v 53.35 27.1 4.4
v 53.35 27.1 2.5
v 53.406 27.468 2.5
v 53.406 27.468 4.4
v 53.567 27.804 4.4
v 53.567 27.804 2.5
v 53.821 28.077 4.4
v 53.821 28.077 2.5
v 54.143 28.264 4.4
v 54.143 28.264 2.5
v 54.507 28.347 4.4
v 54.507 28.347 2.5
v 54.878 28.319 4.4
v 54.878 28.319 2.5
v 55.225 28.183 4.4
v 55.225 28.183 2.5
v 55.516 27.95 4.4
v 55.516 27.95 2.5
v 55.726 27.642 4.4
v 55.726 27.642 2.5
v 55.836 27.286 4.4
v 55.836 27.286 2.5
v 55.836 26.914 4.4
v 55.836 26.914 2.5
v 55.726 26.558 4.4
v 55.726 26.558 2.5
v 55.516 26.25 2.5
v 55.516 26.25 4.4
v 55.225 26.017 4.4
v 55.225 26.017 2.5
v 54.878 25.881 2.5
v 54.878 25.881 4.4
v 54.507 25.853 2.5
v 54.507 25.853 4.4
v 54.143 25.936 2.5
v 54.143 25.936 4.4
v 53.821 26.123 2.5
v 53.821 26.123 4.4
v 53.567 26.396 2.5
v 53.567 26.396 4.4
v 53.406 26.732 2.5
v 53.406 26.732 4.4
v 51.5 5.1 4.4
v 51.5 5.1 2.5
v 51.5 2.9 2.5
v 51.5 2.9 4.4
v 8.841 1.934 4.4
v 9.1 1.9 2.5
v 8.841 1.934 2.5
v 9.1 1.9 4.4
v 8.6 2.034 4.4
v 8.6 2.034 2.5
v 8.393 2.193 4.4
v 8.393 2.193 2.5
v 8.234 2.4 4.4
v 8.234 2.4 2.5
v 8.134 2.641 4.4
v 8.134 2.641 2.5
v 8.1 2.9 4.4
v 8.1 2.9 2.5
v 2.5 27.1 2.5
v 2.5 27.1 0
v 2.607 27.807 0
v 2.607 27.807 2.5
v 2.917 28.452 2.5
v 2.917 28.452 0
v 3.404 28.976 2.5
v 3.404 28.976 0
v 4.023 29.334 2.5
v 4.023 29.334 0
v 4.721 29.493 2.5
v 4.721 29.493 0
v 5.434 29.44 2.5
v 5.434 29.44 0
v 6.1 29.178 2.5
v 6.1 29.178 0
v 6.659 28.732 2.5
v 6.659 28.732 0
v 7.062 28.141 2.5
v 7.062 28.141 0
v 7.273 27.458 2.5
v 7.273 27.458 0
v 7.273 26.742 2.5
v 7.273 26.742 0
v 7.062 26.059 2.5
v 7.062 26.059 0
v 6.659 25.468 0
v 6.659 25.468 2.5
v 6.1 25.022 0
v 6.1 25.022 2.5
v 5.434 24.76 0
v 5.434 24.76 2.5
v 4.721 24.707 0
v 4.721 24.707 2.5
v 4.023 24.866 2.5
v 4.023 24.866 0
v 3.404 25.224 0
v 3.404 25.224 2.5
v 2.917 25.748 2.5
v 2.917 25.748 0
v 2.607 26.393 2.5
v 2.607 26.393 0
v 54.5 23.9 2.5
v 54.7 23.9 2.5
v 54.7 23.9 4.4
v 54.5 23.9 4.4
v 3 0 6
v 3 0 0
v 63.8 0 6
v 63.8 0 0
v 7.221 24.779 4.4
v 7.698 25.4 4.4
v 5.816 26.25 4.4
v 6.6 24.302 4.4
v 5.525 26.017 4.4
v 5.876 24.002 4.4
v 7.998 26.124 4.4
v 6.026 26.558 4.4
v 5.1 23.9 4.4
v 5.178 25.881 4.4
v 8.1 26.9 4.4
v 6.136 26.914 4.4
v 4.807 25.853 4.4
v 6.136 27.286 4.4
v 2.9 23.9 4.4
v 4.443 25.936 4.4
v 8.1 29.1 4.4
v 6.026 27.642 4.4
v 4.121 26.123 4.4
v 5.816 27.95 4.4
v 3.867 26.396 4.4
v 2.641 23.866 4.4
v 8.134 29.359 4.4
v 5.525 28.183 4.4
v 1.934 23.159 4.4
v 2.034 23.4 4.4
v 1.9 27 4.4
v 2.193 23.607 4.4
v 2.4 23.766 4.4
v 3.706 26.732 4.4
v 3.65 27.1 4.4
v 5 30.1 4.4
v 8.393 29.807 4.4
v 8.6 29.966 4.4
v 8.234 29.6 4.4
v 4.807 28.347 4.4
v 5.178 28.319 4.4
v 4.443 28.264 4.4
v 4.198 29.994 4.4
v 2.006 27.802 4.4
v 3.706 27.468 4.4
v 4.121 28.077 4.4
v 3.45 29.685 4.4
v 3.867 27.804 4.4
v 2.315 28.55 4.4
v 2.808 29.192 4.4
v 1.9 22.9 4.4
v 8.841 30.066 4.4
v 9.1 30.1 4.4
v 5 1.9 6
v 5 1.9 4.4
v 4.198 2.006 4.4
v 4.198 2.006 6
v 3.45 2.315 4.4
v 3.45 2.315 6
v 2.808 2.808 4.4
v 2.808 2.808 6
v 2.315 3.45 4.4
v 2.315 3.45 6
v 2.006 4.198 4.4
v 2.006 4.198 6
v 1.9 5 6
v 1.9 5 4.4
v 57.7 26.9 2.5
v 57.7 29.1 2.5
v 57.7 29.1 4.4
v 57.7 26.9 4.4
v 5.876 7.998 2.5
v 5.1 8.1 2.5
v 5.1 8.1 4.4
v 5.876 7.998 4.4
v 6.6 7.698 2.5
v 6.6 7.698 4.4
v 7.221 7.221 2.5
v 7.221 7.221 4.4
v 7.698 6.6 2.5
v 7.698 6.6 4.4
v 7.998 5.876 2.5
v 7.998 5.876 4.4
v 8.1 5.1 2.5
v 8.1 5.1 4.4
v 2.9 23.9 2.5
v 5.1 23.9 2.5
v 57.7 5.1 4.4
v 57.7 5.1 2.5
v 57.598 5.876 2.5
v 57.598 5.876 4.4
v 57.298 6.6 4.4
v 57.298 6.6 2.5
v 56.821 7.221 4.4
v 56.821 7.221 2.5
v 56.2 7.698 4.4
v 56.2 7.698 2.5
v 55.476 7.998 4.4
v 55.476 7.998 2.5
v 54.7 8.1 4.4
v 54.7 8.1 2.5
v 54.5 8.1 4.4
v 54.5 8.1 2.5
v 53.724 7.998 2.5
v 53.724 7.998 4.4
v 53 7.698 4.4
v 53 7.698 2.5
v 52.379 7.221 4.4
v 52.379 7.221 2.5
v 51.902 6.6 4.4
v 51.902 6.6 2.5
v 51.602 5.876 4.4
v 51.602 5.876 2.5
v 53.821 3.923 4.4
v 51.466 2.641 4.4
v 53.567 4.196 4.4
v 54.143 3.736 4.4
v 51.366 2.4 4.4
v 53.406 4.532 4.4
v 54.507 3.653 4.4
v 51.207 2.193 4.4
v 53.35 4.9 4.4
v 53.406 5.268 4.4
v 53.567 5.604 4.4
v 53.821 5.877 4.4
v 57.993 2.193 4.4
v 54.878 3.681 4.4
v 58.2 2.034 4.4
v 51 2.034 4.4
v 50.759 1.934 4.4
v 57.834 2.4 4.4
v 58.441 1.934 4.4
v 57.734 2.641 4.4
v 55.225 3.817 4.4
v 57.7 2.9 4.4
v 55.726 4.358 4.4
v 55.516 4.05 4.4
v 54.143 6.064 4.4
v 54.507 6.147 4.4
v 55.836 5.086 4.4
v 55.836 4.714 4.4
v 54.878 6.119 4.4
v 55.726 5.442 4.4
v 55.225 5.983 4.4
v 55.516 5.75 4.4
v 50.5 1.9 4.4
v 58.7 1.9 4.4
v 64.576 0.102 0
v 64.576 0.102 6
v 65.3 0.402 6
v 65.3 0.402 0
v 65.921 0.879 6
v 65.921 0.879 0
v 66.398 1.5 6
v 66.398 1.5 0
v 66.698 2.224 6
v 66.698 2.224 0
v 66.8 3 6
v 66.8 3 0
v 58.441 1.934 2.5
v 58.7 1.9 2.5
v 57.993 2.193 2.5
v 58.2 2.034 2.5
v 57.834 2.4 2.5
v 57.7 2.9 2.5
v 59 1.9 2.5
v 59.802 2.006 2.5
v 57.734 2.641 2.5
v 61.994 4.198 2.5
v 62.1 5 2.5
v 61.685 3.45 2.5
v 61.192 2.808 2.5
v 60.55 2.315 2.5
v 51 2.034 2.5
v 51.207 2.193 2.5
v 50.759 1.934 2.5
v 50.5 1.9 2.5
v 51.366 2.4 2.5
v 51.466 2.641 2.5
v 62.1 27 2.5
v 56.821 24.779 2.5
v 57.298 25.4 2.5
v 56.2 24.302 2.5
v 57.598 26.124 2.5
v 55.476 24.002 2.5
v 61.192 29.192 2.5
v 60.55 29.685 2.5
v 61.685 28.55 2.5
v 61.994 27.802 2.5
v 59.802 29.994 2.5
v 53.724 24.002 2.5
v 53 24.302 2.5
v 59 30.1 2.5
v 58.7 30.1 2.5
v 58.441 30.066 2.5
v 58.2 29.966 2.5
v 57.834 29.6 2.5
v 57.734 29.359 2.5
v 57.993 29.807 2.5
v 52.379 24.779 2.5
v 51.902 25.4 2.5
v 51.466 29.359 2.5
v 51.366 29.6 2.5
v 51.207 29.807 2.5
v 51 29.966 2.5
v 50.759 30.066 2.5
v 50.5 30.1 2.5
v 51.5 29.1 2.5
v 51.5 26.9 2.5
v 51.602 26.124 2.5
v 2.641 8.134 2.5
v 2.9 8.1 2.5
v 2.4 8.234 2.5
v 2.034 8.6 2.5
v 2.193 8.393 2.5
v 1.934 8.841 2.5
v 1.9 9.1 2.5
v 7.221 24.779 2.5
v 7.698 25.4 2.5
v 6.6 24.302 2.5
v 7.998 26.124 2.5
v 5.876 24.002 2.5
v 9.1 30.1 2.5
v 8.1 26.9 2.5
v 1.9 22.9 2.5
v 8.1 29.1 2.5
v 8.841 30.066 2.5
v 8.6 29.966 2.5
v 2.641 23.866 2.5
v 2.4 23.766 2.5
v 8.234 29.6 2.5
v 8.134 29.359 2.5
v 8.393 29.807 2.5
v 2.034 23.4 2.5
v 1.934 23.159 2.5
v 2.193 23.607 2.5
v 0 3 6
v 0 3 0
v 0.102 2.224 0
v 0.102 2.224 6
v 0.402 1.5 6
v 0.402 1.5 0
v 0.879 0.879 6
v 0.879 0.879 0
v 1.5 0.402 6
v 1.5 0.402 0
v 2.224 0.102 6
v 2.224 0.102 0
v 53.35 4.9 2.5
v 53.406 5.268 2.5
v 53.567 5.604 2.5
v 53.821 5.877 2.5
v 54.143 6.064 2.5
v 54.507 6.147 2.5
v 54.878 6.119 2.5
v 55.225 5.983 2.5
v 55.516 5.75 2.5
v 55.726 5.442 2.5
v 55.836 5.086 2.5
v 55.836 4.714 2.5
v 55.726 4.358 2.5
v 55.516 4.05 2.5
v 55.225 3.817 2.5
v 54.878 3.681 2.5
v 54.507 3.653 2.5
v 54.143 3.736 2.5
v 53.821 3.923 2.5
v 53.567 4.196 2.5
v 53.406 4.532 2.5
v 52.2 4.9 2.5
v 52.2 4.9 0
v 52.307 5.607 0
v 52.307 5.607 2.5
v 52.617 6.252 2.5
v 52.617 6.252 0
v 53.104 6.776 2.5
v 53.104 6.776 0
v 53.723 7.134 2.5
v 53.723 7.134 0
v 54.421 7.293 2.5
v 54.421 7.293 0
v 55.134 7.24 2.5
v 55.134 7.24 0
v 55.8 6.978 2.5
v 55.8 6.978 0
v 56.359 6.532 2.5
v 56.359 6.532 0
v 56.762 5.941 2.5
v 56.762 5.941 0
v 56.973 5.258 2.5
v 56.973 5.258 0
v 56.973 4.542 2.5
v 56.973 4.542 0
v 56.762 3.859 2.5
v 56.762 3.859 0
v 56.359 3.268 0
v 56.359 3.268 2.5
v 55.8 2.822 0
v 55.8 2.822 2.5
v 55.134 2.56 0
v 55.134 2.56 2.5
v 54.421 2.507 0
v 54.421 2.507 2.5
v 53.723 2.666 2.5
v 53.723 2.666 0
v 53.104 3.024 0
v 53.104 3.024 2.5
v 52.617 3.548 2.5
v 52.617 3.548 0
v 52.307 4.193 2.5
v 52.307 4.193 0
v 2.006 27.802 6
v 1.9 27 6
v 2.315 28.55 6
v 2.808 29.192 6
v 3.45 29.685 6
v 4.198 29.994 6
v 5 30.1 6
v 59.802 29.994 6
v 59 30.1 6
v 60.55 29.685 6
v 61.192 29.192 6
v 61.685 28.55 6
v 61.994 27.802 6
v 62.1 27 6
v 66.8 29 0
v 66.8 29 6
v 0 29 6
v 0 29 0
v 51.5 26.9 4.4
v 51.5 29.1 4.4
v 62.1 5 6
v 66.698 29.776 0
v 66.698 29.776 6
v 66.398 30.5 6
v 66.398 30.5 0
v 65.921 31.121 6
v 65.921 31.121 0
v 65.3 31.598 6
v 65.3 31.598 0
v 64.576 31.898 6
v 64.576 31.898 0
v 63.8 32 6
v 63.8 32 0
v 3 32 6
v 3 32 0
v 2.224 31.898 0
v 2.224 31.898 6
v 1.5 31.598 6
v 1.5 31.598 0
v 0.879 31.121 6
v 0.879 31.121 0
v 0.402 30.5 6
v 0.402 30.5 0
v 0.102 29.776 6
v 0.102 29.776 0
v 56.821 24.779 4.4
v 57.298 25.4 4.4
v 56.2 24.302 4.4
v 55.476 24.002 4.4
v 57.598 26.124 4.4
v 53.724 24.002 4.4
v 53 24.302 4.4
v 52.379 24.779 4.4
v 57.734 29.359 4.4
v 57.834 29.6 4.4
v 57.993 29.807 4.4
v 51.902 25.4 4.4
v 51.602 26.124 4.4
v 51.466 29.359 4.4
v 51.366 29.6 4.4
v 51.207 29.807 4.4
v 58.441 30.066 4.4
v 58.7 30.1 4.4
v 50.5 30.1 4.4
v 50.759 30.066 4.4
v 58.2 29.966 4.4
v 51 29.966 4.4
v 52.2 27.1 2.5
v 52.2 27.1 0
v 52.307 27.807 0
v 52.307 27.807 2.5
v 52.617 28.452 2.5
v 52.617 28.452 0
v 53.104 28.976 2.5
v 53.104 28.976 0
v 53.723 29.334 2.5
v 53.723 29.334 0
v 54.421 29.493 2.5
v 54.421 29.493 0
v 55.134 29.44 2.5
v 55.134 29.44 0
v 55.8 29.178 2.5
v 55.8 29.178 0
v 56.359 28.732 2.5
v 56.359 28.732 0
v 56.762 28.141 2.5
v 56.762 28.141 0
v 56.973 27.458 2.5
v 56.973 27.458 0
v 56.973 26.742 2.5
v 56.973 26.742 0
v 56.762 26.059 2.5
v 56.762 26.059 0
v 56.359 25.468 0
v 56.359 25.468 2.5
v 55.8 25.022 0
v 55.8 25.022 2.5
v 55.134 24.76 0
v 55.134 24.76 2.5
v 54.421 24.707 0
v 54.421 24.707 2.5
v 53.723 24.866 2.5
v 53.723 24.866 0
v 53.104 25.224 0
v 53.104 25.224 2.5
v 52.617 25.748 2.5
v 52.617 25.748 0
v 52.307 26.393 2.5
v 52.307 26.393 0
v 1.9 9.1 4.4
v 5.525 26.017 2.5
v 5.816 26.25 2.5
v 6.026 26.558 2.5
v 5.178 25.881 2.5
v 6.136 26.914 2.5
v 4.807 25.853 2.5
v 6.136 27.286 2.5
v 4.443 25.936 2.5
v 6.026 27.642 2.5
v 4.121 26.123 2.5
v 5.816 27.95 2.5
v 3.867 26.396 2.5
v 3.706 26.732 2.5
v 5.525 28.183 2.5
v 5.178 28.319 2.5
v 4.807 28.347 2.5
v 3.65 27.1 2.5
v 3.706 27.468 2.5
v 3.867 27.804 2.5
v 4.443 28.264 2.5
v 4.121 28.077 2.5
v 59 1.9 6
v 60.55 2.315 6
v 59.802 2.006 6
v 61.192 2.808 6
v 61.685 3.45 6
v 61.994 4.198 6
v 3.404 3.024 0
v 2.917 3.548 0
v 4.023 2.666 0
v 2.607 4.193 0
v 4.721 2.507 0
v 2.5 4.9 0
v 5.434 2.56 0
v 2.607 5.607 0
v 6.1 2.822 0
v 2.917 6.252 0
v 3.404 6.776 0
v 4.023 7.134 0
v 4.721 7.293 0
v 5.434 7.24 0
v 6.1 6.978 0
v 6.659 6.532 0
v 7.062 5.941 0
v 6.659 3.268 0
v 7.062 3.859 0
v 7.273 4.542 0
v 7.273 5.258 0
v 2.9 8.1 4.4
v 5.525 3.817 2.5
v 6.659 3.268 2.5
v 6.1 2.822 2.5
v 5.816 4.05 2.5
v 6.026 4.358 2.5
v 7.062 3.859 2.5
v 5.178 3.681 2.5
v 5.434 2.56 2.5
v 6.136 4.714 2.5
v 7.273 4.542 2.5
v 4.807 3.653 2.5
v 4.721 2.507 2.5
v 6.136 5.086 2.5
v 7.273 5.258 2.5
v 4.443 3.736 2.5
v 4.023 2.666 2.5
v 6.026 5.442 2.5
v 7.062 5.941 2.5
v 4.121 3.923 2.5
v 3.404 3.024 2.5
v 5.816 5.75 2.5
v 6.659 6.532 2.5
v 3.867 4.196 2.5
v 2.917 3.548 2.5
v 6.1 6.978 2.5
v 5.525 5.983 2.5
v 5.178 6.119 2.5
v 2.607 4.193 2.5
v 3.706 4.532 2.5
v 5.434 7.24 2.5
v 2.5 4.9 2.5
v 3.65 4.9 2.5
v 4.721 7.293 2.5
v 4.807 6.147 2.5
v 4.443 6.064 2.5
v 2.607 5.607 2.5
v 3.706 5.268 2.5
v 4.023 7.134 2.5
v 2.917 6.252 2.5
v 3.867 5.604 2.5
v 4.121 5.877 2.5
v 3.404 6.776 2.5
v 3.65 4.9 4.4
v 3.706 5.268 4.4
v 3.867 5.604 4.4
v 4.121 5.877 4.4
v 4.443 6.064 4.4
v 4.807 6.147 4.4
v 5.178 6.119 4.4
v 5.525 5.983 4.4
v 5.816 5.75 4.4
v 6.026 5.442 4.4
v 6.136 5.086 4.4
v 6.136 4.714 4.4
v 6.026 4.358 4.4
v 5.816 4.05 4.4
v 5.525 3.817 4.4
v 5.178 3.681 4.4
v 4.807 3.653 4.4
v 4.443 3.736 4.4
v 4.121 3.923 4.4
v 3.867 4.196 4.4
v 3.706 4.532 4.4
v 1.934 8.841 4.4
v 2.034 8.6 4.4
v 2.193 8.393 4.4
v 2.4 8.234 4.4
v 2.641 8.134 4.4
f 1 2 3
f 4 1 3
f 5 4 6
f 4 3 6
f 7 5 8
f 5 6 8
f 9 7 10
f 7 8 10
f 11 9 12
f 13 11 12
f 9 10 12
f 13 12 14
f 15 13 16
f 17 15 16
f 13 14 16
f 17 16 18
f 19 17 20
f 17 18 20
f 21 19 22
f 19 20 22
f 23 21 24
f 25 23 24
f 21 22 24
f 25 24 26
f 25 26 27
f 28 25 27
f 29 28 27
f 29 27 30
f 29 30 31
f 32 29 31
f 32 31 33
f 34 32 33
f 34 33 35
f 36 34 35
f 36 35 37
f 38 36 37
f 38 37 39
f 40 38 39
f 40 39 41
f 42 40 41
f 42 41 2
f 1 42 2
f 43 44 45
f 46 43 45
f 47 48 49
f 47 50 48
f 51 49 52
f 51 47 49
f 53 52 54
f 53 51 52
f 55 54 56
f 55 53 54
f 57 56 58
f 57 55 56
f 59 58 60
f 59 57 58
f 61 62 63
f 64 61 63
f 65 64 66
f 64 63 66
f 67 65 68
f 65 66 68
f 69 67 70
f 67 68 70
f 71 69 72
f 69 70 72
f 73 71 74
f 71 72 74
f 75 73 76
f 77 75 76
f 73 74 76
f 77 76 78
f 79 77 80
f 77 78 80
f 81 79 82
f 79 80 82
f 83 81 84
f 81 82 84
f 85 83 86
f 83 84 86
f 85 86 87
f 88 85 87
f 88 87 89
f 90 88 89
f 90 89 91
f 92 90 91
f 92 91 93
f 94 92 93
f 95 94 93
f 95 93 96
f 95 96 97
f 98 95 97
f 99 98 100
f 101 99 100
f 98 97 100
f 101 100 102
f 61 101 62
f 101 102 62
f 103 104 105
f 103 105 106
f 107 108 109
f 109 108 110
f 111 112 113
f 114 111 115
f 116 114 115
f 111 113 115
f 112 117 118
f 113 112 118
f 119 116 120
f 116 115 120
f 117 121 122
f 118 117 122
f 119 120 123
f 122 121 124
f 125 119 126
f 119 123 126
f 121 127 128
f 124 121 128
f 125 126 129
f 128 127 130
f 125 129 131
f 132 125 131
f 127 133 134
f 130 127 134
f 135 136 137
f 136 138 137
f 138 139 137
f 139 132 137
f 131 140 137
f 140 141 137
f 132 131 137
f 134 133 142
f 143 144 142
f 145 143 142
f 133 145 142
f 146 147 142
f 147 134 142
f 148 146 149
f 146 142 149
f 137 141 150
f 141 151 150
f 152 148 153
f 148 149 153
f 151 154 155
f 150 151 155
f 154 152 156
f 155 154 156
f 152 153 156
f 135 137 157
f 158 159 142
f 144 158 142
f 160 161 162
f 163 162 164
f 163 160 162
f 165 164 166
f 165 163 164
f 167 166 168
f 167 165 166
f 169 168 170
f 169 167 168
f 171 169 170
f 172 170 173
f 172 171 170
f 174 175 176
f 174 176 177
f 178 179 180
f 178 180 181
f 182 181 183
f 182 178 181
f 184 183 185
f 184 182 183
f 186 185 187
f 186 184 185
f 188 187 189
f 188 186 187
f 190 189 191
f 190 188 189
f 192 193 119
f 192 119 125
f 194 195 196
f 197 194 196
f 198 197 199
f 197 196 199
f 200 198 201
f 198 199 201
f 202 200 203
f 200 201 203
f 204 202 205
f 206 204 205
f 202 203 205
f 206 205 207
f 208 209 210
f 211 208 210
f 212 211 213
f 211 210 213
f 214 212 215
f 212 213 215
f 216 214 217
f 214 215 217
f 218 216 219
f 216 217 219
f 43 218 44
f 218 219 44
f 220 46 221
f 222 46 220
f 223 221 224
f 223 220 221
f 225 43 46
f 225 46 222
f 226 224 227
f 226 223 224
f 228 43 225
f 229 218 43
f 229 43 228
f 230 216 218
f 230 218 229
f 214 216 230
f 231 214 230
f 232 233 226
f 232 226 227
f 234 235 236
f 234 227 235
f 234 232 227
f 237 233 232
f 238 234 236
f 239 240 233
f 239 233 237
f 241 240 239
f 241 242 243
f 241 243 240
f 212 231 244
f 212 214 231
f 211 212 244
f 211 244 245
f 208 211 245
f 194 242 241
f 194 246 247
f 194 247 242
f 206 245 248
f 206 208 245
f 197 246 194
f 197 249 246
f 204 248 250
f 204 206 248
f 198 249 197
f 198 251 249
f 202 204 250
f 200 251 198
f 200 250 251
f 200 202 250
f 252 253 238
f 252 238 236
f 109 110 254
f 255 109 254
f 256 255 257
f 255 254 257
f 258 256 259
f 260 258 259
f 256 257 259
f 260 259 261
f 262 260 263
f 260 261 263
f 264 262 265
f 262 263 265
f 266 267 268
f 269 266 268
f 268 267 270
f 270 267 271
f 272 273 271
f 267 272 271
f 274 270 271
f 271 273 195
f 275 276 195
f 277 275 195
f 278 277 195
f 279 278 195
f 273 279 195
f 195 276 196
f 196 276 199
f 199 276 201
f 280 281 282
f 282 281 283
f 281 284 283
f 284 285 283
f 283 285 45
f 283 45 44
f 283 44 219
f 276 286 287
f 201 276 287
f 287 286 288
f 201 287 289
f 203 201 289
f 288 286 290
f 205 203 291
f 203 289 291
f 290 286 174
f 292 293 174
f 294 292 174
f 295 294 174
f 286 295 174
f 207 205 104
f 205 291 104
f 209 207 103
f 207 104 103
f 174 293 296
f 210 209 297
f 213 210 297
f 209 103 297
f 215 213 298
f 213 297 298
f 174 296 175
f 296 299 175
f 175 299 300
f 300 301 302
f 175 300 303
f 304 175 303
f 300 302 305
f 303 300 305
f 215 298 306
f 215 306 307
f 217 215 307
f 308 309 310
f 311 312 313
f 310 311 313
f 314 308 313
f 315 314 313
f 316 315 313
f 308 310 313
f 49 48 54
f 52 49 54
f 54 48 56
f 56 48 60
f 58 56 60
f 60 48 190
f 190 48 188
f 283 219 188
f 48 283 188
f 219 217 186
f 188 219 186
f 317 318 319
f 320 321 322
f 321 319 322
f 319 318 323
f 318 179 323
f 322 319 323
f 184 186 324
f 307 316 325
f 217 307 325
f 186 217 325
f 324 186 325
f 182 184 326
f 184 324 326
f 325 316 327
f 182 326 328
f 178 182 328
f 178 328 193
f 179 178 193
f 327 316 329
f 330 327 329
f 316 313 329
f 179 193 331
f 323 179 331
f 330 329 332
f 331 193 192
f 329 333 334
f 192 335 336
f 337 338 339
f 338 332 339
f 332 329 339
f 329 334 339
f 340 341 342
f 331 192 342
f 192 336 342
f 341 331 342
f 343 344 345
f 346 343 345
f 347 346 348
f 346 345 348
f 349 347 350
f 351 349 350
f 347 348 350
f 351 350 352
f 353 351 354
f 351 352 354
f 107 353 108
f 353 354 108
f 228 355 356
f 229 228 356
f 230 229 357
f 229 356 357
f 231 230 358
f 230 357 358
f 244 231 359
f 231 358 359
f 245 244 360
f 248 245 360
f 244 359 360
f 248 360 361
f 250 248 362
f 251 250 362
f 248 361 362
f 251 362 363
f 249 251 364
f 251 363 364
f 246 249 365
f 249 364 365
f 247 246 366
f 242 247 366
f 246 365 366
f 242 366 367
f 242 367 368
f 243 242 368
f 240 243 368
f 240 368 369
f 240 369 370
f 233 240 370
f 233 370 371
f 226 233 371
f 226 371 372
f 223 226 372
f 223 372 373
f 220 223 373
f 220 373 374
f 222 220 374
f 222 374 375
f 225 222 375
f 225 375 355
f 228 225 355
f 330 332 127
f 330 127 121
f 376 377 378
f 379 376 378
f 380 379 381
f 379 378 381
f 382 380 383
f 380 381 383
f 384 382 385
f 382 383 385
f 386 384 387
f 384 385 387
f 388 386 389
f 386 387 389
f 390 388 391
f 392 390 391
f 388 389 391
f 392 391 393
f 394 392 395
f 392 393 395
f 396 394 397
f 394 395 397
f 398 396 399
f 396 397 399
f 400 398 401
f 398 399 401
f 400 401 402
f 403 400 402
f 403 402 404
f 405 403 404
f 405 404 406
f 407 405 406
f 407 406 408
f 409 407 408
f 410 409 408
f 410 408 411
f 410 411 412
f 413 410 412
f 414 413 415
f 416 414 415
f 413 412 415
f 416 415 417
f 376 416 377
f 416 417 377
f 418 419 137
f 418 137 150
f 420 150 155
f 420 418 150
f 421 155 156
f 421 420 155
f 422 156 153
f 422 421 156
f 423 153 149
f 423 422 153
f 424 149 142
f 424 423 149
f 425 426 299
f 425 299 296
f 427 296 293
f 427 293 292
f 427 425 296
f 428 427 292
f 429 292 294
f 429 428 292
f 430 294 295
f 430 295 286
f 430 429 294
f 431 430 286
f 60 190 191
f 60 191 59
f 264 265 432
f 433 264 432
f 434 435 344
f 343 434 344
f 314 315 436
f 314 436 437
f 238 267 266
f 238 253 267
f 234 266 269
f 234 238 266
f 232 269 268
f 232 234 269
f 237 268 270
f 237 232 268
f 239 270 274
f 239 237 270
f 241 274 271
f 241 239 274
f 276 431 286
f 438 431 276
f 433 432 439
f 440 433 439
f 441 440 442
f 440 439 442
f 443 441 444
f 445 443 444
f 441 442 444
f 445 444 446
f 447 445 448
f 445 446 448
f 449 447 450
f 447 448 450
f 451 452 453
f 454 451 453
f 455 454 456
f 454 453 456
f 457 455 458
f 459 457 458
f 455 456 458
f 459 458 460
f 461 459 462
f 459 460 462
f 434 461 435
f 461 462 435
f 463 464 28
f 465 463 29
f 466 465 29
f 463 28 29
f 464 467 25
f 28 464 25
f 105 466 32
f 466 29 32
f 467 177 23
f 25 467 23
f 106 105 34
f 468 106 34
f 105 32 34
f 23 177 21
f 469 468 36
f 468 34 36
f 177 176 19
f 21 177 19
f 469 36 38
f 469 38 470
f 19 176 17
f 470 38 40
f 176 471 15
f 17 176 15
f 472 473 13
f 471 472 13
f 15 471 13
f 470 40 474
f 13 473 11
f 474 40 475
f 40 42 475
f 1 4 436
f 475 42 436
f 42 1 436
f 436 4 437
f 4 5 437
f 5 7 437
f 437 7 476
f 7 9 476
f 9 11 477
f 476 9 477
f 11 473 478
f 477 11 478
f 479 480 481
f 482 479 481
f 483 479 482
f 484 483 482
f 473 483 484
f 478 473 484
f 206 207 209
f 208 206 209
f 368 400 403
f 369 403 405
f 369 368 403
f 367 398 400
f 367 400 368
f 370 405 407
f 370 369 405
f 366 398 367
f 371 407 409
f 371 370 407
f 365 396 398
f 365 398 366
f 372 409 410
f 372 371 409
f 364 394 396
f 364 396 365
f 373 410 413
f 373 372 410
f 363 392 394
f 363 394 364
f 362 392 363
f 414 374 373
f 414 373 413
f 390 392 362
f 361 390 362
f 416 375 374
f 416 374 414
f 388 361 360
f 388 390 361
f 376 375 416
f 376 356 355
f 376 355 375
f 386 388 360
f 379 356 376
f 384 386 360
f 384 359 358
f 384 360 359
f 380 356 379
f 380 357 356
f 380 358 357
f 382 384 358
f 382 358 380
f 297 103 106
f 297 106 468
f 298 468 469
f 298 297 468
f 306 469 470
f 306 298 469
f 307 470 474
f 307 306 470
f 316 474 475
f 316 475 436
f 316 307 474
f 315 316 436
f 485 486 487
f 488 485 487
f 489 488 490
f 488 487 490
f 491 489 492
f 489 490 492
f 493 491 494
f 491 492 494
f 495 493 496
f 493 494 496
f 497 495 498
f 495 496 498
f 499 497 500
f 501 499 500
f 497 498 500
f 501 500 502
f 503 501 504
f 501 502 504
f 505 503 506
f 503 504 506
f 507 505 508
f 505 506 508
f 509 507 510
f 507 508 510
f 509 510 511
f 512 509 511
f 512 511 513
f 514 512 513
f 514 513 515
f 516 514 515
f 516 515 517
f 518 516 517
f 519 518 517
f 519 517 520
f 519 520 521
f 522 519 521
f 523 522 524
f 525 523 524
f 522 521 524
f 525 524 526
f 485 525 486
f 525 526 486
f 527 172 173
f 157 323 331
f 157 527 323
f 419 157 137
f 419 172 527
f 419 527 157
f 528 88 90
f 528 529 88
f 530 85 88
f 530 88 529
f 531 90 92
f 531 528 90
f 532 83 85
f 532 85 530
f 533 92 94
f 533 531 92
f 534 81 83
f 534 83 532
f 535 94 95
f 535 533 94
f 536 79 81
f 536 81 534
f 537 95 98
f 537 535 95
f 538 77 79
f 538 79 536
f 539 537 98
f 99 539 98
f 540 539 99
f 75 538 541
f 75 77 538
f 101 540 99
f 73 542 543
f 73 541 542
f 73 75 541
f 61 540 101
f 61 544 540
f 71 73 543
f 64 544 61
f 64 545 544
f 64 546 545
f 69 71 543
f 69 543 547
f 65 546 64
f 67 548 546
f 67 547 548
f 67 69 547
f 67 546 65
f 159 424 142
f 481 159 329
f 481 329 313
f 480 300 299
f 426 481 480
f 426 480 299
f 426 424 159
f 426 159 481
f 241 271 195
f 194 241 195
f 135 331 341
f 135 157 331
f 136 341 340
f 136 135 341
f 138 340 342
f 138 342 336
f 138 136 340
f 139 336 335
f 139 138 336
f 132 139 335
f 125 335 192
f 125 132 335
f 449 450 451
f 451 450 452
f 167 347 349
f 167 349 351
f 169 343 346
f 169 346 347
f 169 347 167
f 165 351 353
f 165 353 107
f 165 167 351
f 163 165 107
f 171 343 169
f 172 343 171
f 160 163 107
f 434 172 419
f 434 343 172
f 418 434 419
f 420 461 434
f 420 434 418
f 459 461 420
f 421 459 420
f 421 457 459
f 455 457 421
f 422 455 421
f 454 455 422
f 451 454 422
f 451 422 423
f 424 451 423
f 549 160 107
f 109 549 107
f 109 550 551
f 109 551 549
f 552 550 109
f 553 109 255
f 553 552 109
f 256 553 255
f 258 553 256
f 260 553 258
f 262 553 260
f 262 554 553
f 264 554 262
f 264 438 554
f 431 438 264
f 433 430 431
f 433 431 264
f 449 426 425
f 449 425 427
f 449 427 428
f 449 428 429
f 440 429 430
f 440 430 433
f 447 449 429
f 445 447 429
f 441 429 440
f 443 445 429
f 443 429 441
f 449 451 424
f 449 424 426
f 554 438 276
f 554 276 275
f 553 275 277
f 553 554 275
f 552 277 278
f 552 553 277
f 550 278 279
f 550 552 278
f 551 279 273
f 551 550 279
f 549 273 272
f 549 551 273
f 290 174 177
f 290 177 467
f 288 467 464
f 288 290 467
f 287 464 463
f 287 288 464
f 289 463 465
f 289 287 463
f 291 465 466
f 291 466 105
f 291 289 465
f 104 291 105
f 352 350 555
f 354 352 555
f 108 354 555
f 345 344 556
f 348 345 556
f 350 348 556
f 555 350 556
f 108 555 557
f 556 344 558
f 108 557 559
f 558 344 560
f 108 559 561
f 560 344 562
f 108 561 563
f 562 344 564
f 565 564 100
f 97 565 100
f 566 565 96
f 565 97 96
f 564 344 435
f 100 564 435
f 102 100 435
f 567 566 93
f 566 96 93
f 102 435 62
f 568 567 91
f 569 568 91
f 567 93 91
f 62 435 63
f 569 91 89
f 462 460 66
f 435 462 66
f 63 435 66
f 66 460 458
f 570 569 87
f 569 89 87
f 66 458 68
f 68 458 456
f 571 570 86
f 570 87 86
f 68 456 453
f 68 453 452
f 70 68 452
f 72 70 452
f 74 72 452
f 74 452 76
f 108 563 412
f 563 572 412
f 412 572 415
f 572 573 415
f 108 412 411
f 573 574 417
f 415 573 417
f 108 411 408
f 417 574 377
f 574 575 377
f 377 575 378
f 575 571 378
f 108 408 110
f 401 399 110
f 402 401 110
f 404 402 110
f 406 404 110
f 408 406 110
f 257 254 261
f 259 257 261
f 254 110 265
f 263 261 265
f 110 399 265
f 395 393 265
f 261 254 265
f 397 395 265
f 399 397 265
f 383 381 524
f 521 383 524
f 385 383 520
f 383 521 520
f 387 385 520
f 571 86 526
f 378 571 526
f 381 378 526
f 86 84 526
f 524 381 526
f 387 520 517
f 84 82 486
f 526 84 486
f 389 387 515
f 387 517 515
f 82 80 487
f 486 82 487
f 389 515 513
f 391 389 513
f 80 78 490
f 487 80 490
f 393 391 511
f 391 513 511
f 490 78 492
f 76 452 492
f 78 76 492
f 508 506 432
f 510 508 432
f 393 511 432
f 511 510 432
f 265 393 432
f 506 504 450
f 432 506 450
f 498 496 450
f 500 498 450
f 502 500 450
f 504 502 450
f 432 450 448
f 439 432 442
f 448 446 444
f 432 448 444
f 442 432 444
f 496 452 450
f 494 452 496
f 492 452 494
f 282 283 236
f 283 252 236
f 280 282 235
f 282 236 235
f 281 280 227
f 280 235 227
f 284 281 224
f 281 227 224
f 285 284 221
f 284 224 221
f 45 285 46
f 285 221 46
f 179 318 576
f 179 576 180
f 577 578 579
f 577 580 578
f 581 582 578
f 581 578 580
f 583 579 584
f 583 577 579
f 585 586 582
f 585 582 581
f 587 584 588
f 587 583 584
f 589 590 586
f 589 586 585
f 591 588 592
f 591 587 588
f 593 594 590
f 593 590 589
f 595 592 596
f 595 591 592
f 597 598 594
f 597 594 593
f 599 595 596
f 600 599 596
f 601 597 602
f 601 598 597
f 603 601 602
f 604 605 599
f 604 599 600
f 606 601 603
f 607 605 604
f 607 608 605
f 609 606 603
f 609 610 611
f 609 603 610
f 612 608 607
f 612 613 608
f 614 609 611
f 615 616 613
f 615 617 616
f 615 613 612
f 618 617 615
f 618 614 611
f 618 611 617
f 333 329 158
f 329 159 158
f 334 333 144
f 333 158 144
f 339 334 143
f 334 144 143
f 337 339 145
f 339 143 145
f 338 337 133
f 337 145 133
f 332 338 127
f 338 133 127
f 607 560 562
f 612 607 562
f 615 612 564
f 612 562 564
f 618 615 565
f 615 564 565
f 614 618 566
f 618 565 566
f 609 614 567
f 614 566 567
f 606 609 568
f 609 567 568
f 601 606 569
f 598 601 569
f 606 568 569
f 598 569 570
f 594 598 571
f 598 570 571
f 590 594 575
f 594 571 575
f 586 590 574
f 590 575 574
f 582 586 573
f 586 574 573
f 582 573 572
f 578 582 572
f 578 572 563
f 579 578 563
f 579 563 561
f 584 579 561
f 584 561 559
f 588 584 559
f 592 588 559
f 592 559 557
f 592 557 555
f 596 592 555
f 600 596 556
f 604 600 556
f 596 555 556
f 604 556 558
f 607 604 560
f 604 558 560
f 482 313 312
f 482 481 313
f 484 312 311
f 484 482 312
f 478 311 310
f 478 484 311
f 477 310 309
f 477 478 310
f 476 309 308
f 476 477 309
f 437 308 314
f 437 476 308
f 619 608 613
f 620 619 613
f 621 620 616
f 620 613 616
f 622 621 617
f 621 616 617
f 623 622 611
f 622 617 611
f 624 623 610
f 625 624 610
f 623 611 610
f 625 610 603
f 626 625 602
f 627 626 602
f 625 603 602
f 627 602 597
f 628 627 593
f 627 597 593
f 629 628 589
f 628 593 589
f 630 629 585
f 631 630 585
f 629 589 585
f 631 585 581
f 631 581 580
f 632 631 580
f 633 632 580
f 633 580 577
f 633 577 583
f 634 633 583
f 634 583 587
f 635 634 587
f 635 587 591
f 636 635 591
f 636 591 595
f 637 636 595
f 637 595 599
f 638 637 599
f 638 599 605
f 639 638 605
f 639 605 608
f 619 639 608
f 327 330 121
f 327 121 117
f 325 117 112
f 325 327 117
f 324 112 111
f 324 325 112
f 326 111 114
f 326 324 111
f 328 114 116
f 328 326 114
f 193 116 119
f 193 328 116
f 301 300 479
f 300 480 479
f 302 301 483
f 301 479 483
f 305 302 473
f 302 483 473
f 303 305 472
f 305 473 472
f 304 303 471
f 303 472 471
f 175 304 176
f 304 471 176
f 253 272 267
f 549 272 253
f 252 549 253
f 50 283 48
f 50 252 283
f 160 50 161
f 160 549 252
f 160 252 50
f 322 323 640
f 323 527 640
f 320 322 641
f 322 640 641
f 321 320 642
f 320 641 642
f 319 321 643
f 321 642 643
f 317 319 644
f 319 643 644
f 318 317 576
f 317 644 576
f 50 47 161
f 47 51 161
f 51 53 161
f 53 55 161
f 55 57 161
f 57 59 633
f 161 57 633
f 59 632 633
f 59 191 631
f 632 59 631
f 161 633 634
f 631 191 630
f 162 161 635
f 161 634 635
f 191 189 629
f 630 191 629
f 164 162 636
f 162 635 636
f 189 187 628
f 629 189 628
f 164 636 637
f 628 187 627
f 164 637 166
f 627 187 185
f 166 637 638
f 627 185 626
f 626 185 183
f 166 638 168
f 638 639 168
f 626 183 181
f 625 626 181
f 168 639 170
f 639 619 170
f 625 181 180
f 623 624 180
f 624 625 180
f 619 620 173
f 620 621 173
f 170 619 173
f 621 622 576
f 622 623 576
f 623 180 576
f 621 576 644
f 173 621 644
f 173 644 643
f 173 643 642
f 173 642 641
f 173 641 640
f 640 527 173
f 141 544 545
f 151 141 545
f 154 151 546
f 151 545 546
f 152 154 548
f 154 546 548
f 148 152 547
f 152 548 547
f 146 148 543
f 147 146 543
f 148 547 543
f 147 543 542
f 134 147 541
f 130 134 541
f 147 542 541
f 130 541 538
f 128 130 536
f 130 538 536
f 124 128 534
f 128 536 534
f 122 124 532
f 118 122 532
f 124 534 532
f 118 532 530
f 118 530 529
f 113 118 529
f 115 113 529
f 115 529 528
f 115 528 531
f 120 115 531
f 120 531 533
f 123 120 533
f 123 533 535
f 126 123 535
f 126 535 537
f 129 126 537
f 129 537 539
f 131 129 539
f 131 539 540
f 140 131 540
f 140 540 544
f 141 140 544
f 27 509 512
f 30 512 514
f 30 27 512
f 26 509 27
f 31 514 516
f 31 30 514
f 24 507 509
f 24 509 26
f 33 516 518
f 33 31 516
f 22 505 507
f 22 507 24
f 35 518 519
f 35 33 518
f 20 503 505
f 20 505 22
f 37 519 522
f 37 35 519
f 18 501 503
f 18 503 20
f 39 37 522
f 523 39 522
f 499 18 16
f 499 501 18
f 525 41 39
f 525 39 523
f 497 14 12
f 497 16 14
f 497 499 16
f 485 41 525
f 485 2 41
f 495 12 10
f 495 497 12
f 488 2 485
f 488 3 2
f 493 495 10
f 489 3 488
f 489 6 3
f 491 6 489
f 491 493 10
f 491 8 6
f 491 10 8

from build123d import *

# Parameters (mm, degrees)
EXTRUDE_1_DEPTH     = 6
CUT_EXTRUDE_1_DEPTH = 3.5
EXTRUDE_2_DEPTH     = 1.9
SKETCH_4_R          = 1.25
CUT_EXTRUDE_2_DEPTH = 7
SKETCH_11_R         = 2.4
CUT_EXTRUDE_3_DEPTH = 2.5
FILLET_1_R          = 1


with BuildPart() as part:
    # Эскиз1 → Бобышка-Вытянуть1 (new body)
    with BuildSketch(Plane.XY):
        with BuildLine():
            Line((3, 0), (63.8, 0))
            ThreePointArc((63.8, 0), (65.921320344, 0.878679656), (66.8, 3))
            Line((66.8, 3), (66.8, 29))
            ThreePointArc((66.8, 29), (65.921320344, 31.121320344), (63.8, 32))
            Line((63.8, 32), (3, 32))
            ThreePointArc((3, 32), (0.878679656, 31.121320344), (0, 29))
            Line((0, 29), (0, 3))
            ThreePointArc((0, 3), (0.878679656, 0.878679656), (3, 0))
        make_face()
    extrude(amount=EXTRUDE_1_DEPTH)

    # Эскиз2 → Вырез-Вытянуть1 (cut)
    with BuildSketch(Plane.XY.offset(6)):
        with BuildLine():
            Line((5, 30.1), (59, 30.1))
            ThreePointArc((59, 30.1), (61.192031022, 29.192031022), (62.1, 27))
            Line((62.1, 27), (62.1, 5))
            ThreePointArc((62.1, 5), (61.192031022, 2.807968978), (59, 1.9))
            Line((59, 1.9), (5, 1.9))
            ThreePointArc((5, 1.9), (2.807968978, 2.807968978), (1.9, 5))
            Line((1.9, 5), (1.9, 27))
            ThreePointArc((1.9, 27), (2.807968978, 29.192031022), (5, 30.1))
        make_face()
    extrude(amount=-CUT_EXTRUDE_1_DEPTH, mode=Mode.SUBTRACT)

    # Эскиз3 → Бобышка-Вытянуть2 (add)
    with BuildSketch(Plane.XY.offset(2.5)):
        with BuildLine():
            Line((4.9, 30.1), (8.1, 30.1))
            Line((8.1, 30.1), (8.1, 26.9))
            ThreePointArc((8.1, 26.9), (7.221320344, 24.778679656), (5.1, 23.9))
            Line((5.1, 23.9), (1.9, 23.9))
            Line((1.9, 23.9), (1.9, 27.1))
            ThreePointArc((1.9, 27.1), (2.778679656, 29.221320344), (4.9, 30.1))
        make_face()
        with BuildLine():
            Line((1.9, 8.1), (5.1, 8.1))
            ThreePointArc((5.1, 8.1), (7.221320344, 7.221320344), (8.1, 5.1))
            Line((8.1, 5.1), (8.1, 1.9))
            Line((8.1, 1.9), (4.9, 1.9))
            ThreePointArc((4.9, 1.9), (2.778679656, 2.778679656), (1.9, 4.9))
            Line((1.9, 4.9), (1.9, 8.1))
        make_face()
        with BuildLine():
            Line((51.5, 30.1), (57.7, 30.1))
            Line((57.7, 30.1), (57.7, 26.9))
            ThreePointArc((57.7, 26.9), (56.821320344, 24.778679656), (54.7, 23.9))
            Line((54.7, 23.9), (54.5, 23.9))
            ThreePointArc((54.5, 23.9), (52.378679656, 24.778679656), (51.5, 26.9))
            Line((51.5, 26.9), (51.5, 30.1))
        make_face()
        with BuildLine():
            Line((51.5, 1.9), (57.7, 1.9))
            Line((57.7, 1.9), (57.7, 5.1))
            ThreePointArc((57.7, 5.1), (56.821320344, 7.221320344), (54.7, 8.1))
            Line((54.7, 8.1), (54.5, 8.1))
            ThreePointArc((54.5, 8.1), (52.378679656, 7.221320344), (51.5, 5.1))
            Line((51.5, 5.1), (51.5, 1.9))
        make_face()
    extrude(amount=EXTRUDE_2_DEPTH)

    # Эскиз4 → Вырез-Вытянуть2 (cut, through all)
    with BuildSketch(Plane(origin=(0, 0, 0), x_dir=(-1, 0, 0), z_dir=(0, 0, -1))):
        with Locations((-54.6, 27.1)):
            Circle(SKETCH_4_R)
        with Locations((-4.9, 27.1)):
            Circle(SKETCH_4_R)
        with Locations((-4.9, 4.9)):
            Circle(SKETCH_4_R)
        with Locations((-54.6, 4.9)):
            Circle(SKETCH_4_R)
    extrude(amount=-CUT_EXTRUDE_2_DEPTH, mode=Mode.SUBTRACT)

    # Эскиз11 → Вырез-Вытянуть3 (cut)
    with BuildSketch(Plane(origin=(0, 0, 0), x_dir=(-1, 0, 0), z_dir=(0, 0, -1))):
        with Locations((-54.6, 27.1)):
            Circle(SKETCH_11_R)
        with Locations((-4.9, 27.1)):
            Circle(SKETCH_11_R)
        with Locations((-54.6, 4.9)):
            Circle(SKETCH_11_R)
        with Locations((-4.9, 4.9)):
            Circle(SKETCH_11_R)
    extrude(amount=-CUT_EXTRUDE_3_DEPTH, mode=Mode.SUBTRACT)

    # Скругление1
    fillet_1_edges = [part.edges().sort_by_distance(p)[0] for p in [
        (1.9, 8.1, 3.45),
        (8.1, 1.9, 3.45),
        (1.9, 23.9, 3.45),
        (8.1, 30.1, 3.45),
        (51.5, 30.1, 3.45),
        (57.7, 30.1, 3.45),
        (51.5, 1.9, 3.45),
        (57.7, 1.9, 3.45),
    ]]
    fillet(fillet_1_edges, radius=FILLET_1_R)


solid = part.part
